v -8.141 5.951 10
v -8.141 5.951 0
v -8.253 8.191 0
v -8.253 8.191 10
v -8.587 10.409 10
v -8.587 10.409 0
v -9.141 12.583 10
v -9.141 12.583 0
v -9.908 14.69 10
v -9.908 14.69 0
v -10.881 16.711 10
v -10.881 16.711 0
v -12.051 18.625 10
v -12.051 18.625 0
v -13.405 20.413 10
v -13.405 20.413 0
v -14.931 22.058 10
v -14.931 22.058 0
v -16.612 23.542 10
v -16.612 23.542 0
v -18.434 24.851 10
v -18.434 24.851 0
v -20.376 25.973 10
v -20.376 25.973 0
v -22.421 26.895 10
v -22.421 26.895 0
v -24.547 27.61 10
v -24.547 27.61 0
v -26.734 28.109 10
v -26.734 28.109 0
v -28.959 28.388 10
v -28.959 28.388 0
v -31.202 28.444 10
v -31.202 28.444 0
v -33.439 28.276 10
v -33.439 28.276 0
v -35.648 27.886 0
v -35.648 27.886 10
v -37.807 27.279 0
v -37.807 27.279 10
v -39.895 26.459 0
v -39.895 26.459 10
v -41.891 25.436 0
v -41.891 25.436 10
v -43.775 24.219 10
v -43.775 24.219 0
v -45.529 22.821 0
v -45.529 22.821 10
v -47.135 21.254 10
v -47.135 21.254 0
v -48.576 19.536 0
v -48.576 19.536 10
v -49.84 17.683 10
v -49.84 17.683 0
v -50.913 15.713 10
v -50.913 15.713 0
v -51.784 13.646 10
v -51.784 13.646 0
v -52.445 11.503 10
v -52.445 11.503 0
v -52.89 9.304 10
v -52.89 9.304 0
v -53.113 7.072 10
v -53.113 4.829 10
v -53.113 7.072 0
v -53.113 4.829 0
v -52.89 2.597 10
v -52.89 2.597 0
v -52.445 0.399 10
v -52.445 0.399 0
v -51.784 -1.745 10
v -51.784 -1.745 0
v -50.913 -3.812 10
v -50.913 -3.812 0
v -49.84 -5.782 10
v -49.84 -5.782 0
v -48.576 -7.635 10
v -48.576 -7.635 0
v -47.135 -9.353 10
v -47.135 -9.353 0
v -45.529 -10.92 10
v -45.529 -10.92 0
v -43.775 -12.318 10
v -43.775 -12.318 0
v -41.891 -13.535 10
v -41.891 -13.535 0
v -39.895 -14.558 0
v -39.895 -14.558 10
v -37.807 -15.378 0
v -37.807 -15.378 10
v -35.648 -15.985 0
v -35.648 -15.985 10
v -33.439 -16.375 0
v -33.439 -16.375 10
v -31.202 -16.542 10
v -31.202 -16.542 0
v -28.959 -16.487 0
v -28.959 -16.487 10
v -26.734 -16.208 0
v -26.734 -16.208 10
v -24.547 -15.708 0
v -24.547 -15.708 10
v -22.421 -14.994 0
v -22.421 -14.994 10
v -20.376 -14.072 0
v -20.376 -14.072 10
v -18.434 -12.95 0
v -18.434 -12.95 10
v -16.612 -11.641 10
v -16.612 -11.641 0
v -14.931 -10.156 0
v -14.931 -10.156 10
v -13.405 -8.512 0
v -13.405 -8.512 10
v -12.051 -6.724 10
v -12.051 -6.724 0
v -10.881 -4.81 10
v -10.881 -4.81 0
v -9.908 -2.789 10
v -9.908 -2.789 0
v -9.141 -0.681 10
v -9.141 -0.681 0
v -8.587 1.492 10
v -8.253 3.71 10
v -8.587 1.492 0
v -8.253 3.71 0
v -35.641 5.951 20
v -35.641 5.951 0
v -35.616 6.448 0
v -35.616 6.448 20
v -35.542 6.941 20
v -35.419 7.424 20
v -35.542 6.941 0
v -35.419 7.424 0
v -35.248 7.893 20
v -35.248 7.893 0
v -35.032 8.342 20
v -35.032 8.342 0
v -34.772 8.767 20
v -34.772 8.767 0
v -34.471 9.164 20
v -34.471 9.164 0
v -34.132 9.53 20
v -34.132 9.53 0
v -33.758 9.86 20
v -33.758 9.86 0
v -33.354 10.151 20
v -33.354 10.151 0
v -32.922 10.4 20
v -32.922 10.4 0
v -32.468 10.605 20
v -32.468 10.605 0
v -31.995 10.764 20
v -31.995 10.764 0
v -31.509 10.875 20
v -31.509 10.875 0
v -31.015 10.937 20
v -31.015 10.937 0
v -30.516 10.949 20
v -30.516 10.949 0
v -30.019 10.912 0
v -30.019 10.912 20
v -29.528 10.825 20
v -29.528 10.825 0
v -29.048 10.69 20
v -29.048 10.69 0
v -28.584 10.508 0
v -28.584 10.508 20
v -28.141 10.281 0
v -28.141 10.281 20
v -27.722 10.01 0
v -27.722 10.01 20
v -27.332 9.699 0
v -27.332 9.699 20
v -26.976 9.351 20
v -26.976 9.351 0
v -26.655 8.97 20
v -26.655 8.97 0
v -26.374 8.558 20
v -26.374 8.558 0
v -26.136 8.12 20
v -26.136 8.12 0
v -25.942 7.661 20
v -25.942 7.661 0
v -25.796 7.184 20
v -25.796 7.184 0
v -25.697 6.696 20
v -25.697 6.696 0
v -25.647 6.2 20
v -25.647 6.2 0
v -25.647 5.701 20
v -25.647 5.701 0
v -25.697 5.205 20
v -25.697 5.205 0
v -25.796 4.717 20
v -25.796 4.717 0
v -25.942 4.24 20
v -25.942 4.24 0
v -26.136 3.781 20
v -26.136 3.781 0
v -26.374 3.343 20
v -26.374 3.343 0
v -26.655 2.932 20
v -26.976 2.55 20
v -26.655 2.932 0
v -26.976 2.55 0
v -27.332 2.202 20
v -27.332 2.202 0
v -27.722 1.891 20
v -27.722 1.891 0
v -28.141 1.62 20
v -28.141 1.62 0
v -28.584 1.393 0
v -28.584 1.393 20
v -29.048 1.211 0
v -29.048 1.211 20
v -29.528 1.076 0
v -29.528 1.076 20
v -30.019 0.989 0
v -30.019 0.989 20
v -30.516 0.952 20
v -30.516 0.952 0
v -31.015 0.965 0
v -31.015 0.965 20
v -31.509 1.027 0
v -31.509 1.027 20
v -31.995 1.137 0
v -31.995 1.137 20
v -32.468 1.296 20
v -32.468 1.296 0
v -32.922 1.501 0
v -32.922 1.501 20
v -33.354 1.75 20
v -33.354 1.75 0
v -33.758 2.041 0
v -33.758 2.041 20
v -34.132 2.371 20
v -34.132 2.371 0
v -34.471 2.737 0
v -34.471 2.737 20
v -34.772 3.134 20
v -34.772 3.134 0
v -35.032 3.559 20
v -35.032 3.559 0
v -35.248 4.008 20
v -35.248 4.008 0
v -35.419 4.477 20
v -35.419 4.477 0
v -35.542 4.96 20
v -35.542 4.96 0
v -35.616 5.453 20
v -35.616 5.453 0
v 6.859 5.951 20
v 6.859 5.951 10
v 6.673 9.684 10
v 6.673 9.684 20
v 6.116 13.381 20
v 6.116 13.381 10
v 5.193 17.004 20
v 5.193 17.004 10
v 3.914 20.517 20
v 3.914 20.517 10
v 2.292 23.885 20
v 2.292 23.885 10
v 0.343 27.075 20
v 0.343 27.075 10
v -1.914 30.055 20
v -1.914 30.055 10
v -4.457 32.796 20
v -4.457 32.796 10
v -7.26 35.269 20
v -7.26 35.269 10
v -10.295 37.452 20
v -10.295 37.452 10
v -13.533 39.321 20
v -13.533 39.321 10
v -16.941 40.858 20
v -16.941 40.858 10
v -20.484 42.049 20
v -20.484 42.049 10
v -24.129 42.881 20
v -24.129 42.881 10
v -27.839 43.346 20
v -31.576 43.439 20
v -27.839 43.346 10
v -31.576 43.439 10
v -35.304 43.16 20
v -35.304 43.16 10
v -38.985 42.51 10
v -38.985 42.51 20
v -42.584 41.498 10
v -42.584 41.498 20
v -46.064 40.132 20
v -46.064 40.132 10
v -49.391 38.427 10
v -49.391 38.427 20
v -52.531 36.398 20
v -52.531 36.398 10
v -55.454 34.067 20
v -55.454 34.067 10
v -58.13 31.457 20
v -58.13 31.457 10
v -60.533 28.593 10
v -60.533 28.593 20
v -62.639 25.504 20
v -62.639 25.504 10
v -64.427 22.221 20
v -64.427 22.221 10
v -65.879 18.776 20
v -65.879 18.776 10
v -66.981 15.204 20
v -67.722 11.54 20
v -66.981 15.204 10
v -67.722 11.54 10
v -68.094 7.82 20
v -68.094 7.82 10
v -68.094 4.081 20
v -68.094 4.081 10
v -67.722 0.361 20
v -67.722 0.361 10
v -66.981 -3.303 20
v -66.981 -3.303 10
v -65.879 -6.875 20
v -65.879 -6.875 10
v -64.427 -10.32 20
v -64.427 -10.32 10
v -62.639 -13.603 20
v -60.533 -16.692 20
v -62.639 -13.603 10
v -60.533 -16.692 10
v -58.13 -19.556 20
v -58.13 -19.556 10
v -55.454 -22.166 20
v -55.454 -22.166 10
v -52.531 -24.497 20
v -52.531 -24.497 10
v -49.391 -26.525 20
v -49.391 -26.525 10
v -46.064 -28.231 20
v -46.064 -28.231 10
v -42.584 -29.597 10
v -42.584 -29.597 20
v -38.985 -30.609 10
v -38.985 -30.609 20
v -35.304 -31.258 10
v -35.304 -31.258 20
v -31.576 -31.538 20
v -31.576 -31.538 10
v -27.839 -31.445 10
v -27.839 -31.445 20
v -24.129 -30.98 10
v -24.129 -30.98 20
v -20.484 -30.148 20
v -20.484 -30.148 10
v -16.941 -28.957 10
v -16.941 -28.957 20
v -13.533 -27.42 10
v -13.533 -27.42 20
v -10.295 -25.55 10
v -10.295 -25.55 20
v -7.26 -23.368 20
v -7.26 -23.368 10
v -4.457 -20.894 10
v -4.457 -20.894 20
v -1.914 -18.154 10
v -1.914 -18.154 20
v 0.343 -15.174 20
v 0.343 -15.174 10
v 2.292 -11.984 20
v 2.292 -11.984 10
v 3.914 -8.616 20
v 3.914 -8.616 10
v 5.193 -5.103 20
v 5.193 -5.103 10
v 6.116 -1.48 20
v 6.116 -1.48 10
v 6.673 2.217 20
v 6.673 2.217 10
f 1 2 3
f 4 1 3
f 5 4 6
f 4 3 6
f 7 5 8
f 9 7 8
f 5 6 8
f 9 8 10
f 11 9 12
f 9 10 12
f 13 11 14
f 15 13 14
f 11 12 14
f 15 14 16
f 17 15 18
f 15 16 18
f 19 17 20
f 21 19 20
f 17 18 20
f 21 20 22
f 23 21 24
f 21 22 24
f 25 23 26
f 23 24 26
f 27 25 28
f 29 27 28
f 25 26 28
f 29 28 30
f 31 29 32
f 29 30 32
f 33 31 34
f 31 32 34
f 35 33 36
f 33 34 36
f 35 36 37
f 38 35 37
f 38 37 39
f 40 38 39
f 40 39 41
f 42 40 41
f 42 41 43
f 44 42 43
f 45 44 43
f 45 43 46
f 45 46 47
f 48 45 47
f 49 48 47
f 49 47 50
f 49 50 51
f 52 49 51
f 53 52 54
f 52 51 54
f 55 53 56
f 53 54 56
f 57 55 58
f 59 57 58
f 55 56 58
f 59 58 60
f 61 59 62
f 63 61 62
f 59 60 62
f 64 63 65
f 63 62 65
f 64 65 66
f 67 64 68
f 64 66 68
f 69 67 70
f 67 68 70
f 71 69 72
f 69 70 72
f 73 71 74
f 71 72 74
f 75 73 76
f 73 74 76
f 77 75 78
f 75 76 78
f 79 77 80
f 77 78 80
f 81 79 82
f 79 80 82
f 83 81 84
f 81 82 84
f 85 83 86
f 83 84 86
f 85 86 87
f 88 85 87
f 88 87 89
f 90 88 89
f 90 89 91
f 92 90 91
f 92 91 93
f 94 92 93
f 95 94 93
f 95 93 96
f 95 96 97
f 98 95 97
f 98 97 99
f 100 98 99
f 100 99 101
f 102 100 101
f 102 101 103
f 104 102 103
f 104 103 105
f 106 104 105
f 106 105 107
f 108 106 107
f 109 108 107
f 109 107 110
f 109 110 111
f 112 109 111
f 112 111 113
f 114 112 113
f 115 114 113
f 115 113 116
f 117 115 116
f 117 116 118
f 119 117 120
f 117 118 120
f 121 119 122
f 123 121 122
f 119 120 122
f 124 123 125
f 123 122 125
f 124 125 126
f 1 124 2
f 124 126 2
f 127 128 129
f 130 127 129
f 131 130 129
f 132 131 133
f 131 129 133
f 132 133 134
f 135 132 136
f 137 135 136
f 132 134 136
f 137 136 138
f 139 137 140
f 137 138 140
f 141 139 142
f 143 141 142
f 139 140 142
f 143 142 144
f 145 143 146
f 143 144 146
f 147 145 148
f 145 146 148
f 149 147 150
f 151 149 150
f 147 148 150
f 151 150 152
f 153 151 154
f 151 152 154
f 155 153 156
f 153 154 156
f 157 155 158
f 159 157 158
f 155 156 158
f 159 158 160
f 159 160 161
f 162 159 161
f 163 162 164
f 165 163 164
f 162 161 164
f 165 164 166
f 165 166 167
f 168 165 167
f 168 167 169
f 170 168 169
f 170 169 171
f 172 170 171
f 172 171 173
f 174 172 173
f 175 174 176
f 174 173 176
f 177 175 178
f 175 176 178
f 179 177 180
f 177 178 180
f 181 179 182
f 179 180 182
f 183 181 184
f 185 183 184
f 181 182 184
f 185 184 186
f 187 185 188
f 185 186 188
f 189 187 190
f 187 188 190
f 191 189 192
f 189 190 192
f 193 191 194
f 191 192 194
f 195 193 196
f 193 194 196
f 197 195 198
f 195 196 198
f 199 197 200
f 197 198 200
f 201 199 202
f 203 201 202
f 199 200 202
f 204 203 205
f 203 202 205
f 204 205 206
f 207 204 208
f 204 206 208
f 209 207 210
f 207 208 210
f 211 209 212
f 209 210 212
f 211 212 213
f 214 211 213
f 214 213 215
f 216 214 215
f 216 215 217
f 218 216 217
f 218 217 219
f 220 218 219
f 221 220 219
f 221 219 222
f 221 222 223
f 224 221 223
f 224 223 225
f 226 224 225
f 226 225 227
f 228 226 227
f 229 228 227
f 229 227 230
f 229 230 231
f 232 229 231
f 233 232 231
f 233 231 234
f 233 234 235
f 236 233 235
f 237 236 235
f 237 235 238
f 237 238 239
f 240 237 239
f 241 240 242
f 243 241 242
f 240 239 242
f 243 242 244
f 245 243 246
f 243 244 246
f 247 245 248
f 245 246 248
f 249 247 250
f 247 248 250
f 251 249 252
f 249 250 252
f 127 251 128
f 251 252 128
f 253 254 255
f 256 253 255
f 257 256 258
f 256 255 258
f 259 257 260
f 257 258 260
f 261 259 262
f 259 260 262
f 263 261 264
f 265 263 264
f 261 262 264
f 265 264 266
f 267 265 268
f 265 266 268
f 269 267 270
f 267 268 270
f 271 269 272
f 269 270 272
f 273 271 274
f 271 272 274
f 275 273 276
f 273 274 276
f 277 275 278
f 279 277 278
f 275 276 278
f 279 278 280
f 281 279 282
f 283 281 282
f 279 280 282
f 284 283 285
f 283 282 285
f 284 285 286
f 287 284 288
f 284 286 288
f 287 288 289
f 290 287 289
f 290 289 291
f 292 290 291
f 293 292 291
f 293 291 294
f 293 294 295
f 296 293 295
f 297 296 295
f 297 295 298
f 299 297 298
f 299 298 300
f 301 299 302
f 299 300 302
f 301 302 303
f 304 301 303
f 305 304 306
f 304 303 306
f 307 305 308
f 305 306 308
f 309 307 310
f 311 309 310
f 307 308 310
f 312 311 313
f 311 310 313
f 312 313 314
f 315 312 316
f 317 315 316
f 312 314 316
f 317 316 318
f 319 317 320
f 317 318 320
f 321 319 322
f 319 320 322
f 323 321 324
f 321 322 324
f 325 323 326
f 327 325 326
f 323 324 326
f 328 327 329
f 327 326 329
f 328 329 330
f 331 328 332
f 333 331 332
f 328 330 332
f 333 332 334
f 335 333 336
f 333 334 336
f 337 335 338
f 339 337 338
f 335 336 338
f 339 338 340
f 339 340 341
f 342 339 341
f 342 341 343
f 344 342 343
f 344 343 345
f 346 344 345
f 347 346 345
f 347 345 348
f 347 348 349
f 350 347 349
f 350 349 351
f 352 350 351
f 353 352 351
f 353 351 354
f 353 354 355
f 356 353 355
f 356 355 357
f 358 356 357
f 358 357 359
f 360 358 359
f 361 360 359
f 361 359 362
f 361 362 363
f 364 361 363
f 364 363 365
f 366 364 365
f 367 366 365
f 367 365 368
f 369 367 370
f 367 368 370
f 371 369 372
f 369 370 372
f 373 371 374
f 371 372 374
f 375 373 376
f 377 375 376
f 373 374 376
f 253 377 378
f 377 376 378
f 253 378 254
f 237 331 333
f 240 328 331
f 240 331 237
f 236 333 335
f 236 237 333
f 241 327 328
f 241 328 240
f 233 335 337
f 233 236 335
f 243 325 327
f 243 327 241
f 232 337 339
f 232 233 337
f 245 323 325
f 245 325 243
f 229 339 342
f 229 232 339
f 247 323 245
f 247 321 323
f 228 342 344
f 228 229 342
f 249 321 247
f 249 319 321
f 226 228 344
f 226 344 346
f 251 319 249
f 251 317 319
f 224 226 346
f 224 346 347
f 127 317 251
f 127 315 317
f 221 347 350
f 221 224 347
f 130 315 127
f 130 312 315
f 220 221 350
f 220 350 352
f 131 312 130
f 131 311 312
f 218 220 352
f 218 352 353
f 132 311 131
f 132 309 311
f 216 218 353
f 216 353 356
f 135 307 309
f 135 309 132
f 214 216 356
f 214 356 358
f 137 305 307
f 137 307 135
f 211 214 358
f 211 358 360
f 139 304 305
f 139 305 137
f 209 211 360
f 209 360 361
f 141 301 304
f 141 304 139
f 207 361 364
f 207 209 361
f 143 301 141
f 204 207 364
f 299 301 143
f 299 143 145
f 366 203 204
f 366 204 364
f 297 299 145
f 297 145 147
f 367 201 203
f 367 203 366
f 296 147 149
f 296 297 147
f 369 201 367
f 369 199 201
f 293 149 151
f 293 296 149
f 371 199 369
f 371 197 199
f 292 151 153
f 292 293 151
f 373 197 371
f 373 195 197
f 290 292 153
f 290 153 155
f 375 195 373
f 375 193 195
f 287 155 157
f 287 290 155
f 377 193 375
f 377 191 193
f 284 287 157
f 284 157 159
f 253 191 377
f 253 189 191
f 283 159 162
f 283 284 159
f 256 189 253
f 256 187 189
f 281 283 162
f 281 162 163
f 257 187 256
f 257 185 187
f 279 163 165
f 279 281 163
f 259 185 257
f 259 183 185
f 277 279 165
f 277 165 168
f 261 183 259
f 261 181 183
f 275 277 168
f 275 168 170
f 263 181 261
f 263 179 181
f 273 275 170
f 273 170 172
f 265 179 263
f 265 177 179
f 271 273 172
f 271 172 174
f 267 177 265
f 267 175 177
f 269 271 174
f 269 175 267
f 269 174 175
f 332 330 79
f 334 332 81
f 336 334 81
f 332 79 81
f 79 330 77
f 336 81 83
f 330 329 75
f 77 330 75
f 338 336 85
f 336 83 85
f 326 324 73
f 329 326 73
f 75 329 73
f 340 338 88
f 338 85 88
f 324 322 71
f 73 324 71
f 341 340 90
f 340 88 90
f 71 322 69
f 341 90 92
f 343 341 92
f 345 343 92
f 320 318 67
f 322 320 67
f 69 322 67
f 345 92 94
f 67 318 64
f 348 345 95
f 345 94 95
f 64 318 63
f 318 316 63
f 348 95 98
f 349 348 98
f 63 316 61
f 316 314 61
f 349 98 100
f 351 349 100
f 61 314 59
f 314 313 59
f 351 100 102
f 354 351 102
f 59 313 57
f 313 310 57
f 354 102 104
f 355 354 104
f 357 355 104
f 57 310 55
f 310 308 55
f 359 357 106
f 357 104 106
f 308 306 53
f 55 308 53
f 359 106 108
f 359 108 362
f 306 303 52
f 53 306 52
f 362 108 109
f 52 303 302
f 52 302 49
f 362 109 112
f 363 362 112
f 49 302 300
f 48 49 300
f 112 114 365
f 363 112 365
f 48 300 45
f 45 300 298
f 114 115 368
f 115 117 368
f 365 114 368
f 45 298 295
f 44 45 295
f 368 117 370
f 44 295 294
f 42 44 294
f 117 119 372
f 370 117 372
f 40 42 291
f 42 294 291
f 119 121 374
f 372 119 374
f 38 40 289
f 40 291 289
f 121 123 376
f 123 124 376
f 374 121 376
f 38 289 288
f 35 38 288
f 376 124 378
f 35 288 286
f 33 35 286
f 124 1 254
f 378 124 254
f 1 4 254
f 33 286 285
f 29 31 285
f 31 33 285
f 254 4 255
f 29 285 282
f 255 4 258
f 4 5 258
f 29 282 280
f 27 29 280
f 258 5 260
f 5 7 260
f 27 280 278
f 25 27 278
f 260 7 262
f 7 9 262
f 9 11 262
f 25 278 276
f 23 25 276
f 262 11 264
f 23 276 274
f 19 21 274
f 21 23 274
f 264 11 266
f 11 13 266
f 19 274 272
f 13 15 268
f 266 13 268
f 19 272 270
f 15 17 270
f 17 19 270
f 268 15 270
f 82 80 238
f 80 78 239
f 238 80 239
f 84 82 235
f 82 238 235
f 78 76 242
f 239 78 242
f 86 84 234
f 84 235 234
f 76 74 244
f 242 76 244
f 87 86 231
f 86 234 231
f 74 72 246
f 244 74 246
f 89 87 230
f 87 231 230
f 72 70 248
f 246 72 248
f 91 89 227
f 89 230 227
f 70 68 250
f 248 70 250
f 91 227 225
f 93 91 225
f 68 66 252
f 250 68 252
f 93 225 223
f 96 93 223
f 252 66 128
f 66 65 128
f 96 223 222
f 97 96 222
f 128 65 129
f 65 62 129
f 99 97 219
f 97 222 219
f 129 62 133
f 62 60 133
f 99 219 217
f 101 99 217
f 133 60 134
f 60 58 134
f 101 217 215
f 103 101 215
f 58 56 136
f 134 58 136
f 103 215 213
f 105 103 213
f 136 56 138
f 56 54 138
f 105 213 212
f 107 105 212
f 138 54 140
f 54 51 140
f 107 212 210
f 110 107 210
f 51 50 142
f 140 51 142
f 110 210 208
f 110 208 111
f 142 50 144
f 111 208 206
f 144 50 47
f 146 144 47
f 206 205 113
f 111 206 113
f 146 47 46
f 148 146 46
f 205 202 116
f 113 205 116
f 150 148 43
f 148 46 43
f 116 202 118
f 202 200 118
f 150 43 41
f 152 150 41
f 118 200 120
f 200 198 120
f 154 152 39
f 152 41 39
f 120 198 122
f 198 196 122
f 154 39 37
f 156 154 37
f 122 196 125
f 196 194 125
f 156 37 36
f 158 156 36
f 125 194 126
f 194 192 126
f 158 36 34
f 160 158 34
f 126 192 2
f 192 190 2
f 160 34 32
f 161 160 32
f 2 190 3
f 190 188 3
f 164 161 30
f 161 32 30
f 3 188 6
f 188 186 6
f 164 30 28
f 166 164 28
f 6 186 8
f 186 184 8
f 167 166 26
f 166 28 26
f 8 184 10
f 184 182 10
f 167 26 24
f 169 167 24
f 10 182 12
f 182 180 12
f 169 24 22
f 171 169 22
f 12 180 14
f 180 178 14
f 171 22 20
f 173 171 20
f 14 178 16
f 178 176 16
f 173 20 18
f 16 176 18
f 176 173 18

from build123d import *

# Parameters (mm, degrees)
SKETCH_1_R          = 22.5
EXTRUDE_1_DEPTH     = 10
SKETCH_2_R          = 37.5
EXTRUDE_2_DEPTH     = 10
SKETCH_3_R          = 5
CUT_EXTRUDE_1_DEPTH = 20


with BuildPart() as part:
    # 草图1 → 凸台-拉伸1 (new body)
    with BuildSketch(Plane.XY):
        with Locations((-30.640916886, 5.950554874)):
            Circle(SKETCH_1_R)
    extrude(amount=EXTRUDE_1_DEPTH)

    # 草图2 → 凸台-拉伸2 (add)
    with BuildSketch(Plane.XY.offset(10)):
        with Locations((-30.640916886, 5.950554874)):
            Circle(SKETCH_2_R)
    extrude(amount=EXTRUDE_2_DEPTH)

    # 草图3 → 切除-拉伸1 (cut)
    with BuildSketch(Plane(origin=(0, 0, 0), x_dir=(-1, 0, 0), z_dir=(0, 0, -1))):
        with Locations((30.640916886, 5.950554874)):
            Circle(SKETCH_3_R)
    extrude(amount=-CUT_EXTRUDE_1_DEPTH, mode=Mode.SUBTRACT)


solid = part.part
